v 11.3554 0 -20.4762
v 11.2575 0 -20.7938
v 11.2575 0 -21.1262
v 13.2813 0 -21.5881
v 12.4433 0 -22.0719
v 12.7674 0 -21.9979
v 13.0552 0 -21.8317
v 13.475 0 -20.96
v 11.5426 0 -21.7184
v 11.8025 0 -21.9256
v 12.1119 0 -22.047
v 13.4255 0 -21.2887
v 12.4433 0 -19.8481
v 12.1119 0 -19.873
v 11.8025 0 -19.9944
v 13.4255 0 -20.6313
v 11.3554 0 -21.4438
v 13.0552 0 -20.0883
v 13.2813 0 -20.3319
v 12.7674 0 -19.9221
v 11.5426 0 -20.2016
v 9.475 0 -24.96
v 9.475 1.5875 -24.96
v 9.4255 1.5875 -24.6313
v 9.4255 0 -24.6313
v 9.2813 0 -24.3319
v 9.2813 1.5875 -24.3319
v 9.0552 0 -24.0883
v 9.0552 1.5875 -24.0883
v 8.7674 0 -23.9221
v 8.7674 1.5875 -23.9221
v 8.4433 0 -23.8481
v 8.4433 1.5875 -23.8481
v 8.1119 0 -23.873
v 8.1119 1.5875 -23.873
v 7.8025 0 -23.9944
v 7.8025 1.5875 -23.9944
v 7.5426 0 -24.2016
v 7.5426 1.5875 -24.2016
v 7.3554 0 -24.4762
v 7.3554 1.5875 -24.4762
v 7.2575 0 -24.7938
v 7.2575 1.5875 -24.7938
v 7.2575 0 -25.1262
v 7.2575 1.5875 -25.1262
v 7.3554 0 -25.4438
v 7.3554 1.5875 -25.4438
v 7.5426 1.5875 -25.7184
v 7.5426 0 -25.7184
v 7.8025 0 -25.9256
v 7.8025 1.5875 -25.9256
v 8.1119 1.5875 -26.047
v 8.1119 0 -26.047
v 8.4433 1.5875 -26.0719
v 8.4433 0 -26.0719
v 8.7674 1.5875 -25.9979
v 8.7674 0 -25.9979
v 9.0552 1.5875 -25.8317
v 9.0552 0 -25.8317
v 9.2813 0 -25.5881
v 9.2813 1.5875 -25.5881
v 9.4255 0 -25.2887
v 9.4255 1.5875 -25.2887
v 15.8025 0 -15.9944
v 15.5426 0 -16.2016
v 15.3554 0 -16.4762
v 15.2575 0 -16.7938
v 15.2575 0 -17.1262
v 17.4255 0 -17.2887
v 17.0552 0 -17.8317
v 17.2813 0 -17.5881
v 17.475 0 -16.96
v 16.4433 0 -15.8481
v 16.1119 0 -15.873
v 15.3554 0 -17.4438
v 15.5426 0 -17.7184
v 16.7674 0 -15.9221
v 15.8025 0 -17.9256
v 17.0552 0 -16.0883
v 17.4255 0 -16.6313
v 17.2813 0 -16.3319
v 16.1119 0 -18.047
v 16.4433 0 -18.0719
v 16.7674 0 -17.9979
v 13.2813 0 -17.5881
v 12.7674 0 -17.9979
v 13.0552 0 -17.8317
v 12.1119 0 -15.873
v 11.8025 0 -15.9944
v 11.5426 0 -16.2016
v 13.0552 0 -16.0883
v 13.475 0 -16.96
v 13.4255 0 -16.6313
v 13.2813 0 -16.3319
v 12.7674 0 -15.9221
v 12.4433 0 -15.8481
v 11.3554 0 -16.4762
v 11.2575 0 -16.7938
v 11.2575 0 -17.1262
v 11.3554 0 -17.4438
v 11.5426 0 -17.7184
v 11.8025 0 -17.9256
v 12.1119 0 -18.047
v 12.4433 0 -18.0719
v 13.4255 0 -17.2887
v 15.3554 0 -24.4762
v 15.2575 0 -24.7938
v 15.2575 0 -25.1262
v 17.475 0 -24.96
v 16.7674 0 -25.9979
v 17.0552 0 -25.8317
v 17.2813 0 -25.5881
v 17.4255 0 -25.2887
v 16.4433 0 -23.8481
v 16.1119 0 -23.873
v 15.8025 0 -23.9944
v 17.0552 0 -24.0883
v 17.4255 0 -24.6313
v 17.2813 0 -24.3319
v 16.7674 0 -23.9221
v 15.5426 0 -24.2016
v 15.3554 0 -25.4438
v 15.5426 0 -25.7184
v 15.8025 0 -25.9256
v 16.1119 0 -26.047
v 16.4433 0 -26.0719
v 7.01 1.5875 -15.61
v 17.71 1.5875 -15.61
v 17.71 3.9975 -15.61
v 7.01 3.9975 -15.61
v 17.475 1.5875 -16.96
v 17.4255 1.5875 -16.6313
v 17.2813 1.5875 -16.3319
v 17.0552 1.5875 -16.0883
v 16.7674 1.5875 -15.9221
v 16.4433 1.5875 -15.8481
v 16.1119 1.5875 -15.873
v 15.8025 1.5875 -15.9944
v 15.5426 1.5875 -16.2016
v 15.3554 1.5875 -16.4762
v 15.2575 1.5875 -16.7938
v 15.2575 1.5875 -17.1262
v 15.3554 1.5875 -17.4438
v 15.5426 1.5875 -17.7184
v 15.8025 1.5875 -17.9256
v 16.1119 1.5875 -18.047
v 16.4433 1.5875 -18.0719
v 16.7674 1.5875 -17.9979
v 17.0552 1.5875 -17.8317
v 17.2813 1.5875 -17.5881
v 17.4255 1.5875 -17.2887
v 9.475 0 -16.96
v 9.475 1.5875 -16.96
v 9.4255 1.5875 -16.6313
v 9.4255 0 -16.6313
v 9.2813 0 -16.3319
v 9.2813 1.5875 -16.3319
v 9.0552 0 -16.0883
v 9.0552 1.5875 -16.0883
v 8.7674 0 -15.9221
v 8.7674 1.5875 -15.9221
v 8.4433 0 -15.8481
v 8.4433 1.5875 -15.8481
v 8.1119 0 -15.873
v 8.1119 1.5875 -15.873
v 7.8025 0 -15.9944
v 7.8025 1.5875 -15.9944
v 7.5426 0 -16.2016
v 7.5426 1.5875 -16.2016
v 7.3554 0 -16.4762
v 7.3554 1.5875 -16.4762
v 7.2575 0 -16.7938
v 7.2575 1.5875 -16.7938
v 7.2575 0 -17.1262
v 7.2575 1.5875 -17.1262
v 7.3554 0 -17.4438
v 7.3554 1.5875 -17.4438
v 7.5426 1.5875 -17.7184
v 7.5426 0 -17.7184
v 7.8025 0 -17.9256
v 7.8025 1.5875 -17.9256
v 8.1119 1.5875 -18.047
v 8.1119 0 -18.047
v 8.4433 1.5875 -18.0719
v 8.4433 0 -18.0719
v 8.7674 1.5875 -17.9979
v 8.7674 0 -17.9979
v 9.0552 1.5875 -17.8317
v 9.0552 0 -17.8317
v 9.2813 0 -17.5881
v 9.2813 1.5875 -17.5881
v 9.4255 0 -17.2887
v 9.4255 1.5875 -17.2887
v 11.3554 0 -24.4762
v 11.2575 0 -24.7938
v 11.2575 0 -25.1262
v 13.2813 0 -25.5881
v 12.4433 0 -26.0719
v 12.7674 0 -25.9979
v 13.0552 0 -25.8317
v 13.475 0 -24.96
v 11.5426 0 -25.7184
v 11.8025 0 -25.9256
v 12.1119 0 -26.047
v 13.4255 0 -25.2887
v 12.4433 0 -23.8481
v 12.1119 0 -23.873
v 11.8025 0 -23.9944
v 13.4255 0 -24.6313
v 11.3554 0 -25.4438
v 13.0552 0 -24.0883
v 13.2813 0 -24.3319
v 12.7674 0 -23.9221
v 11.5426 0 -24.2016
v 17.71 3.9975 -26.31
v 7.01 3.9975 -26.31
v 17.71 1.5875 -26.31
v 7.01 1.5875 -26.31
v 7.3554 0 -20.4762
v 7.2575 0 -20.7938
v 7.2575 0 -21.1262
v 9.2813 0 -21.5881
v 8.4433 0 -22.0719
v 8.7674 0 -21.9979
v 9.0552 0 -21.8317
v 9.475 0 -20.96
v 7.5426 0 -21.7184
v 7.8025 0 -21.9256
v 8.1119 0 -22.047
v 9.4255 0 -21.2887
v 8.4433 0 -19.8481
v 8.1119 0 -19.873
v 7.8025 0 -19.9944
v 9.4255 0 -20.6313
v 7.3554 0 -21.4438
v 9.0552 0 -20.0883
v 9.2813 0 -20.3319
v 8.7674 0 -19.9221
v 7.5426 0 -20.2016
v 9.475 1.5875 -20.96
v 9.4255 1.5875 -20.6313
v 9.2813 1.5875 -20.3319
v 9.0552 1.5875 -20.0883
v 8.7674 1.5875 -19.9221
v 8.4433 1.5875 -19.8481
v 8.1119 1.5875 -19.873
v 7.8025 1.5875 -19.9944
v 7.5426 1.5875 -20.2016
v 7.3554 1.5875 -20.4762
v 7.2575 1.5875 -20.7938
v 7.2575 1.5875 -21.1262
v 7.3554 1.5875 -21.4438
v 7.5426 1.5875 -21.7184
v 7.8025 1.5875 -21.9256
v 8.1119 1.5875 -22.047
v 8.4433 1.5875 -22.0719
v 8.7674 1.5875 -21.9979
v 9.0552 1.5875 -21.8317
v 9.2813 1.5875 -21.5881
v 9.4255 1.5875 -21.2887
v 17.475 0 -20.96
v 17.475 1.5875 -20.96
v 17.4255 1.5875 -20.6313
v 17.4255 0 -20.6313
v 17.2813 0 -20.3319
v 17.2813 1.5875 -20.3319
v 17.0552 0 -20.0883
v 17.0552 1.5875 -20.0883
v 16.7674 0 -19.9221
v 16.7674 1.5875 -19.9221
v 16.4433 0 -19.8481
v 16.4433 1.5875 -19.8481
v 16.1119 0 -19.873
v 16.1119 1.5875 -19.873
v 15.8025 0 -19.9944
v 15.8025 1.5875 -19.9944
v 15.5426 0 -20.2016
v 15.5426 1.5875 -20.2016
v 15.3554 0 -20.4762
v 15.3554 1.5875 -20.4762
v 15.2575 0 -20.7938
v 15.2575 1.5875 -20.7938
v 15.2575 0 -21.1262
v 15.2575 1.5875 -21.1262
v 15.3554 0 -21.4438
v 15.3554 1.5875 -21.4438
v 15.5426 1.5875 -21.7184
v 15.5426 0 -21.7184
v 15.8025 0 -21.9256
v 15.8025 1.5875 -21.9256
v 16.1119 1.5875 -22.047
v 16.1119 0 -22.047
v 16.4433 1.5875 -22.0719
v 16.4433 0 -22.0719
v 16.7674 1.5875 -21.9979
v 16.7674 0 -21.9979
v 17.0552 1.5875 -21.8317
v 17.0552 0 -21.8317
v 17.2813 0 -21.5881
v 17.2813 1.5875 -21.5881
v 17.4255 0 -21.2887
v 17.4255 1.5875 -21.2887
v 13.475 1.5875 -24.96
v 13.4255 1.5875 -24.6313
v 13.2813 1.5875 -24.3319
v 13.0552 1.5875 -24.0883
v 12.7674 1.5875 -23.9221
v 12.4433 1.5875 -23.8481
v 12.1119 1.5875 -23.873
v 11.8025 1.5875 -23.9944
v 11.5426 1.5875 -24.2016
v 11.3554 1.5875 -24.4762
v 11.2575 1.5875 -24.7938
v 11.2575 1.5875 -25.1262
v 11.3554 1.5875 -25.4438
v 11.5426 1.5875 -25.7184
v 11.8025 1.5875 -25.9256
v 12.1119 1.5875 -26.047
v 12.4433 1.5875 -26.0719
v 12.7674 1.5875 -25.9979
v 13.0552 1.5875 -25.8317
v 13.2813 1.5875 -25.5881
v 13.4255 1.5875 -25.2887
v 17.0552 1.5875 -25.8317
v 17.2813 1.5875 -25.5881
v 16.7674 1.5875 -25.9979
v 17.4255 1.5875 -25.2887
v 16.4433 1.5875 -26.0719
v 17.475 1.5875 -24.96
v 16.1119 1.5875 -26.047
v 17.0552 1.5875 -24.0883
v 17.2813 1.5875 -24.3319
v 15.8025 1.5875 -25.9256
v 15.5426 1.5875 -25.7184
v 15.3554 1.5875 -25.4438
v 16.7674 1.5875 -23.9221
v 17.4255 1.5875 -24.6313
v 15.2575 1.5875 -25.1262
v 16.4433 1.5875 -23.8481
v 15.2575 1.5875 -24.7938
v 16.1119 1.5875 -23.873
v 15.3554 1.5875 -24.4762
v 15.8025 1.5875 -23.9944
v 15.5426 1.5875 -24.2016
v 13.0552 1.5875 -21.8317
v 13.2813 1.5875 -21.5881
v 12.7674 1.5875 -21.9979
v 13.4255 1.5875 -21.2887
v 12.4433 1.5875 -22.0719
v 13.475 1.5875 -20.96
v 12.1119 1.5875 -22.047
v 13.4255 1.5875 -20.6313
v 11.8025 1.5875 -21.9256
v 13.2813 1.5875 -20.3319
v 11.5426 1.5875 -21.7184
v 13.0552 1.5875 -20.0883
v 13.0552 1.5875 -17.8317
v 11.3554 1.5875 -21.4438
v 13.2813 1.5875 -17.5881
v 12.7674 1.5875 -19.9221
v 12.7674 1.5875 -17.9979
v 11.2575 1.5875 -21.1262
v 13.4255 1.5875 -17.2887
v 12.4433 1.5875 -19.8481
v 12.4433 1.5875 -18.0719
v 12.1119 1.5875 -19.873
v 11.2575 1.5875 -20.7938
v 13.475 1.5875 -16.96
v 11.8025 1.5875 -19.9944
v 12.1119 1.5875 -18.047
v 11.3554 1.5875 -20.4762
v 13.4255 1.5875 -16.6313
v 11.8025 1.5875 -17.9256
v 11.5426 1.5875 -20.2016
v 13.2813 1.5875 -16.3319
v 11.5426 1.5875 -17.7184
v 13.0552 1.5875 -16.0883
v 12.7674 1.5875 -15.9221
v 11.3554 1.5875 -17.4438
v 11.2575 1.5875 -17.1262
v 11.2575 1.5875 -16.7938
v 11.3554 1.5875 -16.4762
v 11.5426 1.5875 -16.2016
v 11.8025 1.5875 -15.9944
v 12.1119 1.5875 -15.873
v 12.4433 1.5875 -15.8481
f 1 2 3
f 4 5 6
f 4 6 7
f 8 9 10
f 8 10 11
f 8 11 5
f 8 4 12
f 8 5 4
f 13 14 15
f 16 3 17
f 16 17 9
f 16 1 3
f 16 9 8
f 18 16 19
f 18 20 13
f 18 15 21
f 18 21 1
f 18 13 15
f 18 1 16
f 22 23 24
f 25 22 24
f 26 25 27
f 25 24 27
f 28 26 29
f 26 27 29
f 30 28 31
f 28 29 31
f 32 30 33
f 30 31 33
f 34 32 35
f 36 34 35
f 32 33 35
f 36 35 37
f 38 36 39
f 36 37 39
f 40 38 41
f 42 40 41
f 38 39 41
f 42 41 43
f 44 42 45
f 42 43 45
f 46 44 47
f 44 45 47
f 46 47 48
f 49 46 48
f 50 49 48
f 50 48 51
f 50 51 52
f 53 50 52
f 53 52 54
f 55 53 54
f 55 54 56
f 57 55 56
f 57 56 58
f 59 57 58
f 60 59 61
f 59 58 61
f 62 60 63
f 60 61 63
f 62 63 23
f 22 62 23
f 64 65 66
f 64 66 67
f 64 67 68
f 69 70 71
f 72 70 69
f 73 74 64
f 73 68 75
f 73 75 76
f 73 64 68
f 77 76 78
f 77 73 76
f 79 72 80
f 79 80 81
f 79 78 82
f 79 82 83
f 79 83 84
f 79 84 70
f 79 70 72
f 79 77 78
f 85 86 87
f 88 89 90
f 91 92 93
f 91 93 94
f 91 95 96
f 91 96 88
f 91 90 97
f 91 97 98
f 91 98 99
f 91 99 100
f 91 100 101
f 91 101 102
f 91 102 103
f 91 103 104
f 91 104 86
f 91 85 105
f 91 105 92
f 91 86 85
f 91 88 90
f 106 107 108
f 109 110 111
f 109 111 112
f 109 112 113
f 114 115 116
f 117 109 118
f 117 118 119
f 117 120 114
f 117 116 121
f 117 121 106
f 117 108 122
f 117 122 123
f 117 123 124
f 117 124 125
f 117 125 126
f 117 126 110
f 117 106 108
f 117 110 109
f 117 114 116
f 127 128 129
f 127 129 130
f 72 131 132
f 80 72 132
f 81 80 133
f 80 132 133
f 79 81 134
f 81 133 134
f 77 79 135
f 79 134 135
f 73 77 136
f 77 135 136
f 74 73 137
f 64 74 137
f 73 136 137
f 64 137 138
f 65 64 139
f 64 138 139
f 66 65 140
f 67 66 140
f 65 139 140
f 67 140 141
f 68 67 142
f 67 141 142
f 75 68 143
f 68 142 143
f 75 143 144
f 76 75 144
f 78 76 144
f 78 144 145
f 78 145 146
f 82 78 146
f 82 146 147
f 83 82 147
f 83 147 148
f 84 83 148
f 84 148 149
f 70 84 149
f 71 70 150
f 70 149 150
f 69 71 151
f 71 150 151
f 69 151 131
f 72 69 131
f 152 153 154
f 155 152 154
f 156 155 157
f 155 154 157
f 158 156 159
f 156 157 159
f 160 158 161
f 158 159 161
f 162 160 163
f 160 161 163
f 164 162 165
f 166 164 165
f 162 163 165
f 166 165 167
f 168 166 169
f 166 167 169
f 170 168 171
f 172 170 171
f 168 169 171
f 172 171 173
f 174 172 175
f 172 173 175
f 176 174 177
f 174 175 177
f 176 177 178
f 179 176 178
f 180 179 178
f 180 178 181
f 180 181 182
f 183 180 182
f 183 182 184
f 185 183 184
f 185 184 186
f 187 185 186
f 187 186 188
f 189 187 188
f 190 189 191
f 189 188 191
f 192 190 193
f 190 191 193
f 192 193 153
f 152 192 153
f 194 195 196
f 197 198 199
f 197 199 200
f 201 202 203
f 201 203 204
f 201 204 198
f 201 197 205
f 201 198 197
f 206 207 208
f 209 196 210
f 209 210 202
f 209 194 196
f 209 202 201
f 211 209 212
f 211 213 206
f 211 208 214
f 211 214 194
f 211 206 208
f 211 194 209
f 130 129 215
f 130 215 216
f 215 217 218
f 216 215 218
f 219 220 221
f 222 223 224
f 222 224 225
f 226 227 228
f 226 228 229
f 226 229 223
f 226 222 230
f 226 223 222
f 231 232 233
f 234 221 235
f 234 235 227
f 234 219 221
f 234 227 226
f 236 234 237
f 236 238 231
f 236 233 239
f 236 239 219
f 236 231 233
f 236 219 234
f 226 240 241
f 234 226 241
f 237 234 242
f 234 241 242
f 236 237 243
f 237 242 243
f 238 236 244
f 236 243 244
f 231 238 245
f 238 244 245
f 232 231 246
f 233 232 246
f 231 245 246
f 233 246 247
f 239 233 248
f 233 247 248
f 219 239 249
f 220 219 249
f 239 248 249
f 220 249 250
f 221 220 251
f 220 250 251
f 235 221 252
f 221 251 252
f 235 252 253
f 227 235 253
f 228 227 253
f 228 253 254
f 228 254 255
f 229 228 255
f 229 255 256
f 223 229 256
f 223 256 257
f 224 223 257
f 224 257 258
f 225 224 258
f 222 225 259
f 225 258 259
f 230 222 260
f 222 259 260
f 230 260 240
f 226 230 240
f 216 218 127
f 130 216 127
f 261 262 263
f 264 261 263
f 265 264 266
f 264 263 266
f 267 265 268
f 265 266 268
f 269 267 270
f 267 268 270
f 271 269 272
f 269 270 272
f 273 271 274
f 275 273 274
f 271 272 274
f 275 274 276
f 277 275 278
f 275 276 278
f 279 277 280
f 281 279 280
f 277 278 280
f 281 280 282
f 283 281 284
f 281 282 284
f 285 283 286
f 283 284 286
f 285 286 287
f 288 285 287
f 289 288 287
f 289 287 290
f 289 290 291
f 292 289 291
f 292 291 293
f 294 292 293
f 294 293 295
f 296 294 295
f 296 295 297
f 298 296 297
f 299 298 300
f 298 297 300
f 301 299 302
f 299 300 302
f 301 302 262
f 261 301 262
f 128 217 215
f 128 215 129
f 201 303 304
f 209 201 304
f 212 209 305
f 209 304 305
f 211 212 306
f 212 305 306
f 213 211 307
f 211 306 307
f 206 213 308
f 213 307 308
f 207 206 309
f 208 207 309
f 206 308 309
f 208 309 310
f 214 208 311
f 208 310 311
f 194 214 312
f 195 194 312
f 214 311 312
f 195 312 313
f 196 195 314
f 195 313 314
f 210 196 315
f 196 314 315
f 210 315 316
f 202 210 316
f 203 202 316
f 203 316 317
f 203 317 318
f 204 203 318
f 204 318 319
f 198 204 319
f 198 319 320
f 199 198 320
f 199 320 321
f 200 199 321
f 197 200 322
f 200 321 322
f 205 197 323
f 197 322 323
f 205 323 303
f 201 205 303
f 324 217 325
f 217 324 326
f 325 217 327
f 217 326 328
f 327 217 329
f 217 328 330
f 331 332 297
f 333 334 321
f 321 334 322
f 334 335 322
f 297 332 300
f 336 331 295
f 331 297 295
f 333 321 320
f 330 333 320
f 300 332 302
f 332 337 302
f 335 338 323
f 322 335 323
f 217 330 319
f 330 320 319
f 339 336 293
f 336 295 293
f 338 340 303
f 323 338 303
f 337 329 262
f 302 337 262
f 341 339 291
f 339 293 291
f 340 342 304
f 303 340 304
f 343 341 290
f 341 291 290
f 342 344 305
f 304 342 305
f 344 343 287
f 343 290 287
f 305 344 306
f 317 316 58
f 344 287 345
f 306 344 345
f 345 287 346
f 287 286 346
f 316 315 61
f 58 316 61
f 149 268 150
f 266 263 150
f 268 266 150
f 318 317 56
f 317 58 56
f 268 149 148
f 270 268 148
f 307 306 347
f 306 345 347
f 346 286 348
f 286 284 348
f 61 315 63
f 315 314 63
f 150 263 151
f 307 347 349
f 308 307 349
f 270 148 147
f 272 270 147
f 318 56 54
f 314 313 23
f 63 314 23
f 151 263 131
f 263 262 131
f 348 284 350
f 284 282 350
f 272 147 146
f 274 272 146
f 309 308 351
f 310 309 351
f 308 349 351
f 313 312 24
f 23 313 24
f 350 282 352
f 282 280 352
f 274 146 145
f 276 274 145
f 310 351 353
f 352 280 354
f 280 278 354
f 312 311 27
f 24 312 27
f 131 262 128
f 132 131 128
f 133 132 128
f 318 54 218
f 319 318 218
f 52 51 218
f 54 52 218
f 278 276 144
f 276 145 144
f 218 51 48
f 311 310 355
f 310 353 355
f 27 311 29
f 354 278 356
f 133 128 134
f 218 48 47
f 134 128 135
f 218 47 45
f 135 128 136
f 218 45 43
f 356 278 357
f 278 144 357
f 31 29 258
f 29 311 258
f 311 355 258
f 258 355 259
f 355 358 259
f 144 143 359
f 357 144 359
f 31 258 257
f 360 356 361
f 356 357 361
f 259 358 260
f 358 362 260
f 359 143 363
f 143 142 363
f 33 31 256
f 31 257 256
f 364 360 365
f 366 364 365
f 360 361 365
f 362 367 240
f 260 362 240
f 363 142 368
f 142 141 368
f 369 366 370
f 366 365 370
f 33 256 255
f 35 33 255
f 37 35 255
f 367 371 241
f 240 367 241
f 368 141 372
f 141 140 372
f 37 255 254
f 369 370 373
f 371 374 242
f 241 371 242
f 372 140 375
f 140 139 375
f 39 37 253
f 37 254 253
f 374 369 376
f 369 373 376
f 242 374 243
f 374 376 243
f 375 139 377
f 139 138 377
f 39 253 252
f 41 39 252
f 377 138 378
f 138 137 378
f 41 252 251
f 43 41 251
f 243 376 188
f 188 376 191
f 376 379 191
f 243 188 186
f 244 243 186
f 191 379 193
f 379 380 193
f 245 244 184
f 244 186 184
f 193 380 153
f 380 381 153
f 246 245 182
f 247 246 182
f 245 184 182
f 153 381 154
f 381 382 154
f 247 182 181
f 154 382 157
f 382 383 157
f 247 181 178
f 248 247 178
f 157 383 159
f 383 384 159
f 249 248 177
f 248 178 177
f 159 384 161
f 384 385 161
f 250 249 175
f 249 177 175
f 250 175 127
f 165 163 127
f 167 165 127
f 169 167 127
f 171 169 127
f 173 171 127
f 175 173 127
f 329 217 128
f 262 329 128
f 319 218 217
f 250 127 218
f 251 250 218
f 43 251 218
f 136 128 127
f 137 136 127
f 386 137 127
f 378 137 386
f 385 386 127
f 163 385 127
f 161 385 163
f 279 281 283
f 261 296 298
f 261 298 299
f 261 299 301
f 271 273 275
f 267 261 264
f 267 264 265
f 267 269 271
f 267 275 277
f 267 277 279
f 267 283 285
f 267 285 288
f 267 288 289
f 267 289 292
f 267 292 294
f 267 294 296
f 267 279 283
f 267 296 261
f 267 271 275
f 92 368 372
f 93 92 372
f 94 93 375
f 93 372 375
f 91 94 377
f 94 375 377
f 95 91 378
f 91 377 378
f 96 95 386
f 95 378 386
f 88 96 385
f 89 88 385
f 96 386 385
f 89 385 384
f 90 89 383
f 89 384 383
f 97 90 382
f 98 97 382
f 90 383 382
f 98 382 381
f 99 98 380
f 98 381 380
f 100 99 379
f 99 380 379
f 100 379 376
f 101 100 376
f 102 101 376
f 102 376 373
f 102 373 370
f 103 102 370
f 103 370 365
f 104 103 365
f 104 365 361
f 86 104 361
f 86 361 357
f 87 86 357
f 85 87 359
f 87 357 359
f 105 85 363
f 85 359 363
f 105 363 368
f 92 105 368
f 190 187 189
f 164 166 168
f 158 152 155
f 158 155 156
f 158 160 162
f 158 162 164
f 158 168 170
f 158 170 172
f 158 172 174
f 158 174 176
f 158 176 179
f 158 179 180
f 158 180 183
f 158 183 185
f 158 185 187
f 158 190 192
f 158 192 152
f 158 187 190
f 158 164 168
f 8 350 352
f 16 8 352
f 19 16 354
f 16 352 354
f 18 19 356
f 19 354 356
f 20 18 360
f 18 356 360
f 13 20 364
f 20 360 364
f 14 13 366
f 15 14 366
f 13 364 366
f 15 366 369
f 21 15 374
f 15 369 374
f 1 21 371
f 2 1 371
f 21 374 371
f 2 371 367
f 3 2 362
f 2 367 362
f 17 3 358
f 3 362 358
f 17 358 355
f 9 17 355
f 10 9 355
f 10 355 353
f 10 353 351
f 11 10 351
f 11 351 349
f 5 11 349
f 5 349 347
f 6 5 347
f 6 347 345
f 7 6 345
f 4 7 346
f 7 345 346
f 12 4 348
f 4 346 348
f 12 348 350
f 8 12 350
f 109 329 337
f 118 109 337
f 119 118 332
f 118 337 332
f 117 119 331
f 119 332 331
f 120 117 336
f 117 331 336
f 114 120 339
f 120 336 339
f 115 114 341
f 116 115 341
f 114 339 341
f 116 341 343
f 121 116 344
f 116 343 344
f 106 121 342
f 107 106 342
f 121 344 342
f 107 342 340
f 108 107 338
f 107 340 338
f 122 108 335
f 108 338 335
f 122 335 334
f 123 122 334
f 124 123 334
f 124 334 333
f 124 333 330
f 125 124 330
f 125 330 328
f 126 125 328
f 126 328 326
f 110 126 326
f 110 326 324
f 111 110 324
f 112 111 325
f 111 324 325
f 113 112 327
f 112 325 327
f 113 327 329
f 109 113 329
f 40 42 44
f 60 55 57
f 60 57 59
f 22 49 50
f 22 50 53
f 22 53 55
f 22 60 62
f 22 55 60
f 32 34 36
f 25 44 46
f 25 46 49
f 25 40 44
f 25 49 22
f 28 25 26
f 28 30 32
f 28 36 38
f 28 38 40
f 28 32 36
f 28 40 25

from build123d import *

# Parameters (mm, degrees)
SKETCH3_W           = 10.7
SKETCH3_H           = 10.7
BOSS_EXTRUDE2_DEPTH = 2.41
SKETCH5_R           = 1.115
BOSS_EXTRUDE3_DEPTH = 1.5875


with BuildPart() as part:
    # Sketch3 → Boss-Extrude2 (new body)
    with BuildSketch(Plane(origin=(0, 1.5875, 0), x_dir=(-1, 0, 0), z_dir=(0, 1, 0))):
        with Locations((-12.36, -20.96)):
            Rectangle(SKETCH3_W, SKETCH3_H)
    extrude(amount=BOSS_EXTRUDE2_DEPTH)

    # Sketch5 → Boss-Extrude3 (add)
    with BuildSketch(Plane.XZ.offset(-1.5875)):
        with Locations((16.36, -24.96)):
            Circle(SKETCH5_R)
        with Locations((12.36, -24.96)):
            Circle(SKETCH5_R)
        with Locations((8.36, -24.96)):
            Circle(SKETCH5_R)
        with Locations((16.36, -20.96)):
            Circle(SKETCH5_R)
        with Locations((12.36, -20.96)):
            Circle(SKETCH5_R)
        with Locations((8.36, -20.96)):
            Circle(SKETCH5_R)
        with Locations((16.36, -16.96)):
            Circle(SKETCH5_R)
        with Locations((12.36, -16.96)):
            Circle(SKETCH5_R)
        with Locations((8.36, -16.96)):
            Circle(SKETCH5_R)
    extrude(amount=BOSS_EXTRUDE3_DEPTH)


solid = part.part
